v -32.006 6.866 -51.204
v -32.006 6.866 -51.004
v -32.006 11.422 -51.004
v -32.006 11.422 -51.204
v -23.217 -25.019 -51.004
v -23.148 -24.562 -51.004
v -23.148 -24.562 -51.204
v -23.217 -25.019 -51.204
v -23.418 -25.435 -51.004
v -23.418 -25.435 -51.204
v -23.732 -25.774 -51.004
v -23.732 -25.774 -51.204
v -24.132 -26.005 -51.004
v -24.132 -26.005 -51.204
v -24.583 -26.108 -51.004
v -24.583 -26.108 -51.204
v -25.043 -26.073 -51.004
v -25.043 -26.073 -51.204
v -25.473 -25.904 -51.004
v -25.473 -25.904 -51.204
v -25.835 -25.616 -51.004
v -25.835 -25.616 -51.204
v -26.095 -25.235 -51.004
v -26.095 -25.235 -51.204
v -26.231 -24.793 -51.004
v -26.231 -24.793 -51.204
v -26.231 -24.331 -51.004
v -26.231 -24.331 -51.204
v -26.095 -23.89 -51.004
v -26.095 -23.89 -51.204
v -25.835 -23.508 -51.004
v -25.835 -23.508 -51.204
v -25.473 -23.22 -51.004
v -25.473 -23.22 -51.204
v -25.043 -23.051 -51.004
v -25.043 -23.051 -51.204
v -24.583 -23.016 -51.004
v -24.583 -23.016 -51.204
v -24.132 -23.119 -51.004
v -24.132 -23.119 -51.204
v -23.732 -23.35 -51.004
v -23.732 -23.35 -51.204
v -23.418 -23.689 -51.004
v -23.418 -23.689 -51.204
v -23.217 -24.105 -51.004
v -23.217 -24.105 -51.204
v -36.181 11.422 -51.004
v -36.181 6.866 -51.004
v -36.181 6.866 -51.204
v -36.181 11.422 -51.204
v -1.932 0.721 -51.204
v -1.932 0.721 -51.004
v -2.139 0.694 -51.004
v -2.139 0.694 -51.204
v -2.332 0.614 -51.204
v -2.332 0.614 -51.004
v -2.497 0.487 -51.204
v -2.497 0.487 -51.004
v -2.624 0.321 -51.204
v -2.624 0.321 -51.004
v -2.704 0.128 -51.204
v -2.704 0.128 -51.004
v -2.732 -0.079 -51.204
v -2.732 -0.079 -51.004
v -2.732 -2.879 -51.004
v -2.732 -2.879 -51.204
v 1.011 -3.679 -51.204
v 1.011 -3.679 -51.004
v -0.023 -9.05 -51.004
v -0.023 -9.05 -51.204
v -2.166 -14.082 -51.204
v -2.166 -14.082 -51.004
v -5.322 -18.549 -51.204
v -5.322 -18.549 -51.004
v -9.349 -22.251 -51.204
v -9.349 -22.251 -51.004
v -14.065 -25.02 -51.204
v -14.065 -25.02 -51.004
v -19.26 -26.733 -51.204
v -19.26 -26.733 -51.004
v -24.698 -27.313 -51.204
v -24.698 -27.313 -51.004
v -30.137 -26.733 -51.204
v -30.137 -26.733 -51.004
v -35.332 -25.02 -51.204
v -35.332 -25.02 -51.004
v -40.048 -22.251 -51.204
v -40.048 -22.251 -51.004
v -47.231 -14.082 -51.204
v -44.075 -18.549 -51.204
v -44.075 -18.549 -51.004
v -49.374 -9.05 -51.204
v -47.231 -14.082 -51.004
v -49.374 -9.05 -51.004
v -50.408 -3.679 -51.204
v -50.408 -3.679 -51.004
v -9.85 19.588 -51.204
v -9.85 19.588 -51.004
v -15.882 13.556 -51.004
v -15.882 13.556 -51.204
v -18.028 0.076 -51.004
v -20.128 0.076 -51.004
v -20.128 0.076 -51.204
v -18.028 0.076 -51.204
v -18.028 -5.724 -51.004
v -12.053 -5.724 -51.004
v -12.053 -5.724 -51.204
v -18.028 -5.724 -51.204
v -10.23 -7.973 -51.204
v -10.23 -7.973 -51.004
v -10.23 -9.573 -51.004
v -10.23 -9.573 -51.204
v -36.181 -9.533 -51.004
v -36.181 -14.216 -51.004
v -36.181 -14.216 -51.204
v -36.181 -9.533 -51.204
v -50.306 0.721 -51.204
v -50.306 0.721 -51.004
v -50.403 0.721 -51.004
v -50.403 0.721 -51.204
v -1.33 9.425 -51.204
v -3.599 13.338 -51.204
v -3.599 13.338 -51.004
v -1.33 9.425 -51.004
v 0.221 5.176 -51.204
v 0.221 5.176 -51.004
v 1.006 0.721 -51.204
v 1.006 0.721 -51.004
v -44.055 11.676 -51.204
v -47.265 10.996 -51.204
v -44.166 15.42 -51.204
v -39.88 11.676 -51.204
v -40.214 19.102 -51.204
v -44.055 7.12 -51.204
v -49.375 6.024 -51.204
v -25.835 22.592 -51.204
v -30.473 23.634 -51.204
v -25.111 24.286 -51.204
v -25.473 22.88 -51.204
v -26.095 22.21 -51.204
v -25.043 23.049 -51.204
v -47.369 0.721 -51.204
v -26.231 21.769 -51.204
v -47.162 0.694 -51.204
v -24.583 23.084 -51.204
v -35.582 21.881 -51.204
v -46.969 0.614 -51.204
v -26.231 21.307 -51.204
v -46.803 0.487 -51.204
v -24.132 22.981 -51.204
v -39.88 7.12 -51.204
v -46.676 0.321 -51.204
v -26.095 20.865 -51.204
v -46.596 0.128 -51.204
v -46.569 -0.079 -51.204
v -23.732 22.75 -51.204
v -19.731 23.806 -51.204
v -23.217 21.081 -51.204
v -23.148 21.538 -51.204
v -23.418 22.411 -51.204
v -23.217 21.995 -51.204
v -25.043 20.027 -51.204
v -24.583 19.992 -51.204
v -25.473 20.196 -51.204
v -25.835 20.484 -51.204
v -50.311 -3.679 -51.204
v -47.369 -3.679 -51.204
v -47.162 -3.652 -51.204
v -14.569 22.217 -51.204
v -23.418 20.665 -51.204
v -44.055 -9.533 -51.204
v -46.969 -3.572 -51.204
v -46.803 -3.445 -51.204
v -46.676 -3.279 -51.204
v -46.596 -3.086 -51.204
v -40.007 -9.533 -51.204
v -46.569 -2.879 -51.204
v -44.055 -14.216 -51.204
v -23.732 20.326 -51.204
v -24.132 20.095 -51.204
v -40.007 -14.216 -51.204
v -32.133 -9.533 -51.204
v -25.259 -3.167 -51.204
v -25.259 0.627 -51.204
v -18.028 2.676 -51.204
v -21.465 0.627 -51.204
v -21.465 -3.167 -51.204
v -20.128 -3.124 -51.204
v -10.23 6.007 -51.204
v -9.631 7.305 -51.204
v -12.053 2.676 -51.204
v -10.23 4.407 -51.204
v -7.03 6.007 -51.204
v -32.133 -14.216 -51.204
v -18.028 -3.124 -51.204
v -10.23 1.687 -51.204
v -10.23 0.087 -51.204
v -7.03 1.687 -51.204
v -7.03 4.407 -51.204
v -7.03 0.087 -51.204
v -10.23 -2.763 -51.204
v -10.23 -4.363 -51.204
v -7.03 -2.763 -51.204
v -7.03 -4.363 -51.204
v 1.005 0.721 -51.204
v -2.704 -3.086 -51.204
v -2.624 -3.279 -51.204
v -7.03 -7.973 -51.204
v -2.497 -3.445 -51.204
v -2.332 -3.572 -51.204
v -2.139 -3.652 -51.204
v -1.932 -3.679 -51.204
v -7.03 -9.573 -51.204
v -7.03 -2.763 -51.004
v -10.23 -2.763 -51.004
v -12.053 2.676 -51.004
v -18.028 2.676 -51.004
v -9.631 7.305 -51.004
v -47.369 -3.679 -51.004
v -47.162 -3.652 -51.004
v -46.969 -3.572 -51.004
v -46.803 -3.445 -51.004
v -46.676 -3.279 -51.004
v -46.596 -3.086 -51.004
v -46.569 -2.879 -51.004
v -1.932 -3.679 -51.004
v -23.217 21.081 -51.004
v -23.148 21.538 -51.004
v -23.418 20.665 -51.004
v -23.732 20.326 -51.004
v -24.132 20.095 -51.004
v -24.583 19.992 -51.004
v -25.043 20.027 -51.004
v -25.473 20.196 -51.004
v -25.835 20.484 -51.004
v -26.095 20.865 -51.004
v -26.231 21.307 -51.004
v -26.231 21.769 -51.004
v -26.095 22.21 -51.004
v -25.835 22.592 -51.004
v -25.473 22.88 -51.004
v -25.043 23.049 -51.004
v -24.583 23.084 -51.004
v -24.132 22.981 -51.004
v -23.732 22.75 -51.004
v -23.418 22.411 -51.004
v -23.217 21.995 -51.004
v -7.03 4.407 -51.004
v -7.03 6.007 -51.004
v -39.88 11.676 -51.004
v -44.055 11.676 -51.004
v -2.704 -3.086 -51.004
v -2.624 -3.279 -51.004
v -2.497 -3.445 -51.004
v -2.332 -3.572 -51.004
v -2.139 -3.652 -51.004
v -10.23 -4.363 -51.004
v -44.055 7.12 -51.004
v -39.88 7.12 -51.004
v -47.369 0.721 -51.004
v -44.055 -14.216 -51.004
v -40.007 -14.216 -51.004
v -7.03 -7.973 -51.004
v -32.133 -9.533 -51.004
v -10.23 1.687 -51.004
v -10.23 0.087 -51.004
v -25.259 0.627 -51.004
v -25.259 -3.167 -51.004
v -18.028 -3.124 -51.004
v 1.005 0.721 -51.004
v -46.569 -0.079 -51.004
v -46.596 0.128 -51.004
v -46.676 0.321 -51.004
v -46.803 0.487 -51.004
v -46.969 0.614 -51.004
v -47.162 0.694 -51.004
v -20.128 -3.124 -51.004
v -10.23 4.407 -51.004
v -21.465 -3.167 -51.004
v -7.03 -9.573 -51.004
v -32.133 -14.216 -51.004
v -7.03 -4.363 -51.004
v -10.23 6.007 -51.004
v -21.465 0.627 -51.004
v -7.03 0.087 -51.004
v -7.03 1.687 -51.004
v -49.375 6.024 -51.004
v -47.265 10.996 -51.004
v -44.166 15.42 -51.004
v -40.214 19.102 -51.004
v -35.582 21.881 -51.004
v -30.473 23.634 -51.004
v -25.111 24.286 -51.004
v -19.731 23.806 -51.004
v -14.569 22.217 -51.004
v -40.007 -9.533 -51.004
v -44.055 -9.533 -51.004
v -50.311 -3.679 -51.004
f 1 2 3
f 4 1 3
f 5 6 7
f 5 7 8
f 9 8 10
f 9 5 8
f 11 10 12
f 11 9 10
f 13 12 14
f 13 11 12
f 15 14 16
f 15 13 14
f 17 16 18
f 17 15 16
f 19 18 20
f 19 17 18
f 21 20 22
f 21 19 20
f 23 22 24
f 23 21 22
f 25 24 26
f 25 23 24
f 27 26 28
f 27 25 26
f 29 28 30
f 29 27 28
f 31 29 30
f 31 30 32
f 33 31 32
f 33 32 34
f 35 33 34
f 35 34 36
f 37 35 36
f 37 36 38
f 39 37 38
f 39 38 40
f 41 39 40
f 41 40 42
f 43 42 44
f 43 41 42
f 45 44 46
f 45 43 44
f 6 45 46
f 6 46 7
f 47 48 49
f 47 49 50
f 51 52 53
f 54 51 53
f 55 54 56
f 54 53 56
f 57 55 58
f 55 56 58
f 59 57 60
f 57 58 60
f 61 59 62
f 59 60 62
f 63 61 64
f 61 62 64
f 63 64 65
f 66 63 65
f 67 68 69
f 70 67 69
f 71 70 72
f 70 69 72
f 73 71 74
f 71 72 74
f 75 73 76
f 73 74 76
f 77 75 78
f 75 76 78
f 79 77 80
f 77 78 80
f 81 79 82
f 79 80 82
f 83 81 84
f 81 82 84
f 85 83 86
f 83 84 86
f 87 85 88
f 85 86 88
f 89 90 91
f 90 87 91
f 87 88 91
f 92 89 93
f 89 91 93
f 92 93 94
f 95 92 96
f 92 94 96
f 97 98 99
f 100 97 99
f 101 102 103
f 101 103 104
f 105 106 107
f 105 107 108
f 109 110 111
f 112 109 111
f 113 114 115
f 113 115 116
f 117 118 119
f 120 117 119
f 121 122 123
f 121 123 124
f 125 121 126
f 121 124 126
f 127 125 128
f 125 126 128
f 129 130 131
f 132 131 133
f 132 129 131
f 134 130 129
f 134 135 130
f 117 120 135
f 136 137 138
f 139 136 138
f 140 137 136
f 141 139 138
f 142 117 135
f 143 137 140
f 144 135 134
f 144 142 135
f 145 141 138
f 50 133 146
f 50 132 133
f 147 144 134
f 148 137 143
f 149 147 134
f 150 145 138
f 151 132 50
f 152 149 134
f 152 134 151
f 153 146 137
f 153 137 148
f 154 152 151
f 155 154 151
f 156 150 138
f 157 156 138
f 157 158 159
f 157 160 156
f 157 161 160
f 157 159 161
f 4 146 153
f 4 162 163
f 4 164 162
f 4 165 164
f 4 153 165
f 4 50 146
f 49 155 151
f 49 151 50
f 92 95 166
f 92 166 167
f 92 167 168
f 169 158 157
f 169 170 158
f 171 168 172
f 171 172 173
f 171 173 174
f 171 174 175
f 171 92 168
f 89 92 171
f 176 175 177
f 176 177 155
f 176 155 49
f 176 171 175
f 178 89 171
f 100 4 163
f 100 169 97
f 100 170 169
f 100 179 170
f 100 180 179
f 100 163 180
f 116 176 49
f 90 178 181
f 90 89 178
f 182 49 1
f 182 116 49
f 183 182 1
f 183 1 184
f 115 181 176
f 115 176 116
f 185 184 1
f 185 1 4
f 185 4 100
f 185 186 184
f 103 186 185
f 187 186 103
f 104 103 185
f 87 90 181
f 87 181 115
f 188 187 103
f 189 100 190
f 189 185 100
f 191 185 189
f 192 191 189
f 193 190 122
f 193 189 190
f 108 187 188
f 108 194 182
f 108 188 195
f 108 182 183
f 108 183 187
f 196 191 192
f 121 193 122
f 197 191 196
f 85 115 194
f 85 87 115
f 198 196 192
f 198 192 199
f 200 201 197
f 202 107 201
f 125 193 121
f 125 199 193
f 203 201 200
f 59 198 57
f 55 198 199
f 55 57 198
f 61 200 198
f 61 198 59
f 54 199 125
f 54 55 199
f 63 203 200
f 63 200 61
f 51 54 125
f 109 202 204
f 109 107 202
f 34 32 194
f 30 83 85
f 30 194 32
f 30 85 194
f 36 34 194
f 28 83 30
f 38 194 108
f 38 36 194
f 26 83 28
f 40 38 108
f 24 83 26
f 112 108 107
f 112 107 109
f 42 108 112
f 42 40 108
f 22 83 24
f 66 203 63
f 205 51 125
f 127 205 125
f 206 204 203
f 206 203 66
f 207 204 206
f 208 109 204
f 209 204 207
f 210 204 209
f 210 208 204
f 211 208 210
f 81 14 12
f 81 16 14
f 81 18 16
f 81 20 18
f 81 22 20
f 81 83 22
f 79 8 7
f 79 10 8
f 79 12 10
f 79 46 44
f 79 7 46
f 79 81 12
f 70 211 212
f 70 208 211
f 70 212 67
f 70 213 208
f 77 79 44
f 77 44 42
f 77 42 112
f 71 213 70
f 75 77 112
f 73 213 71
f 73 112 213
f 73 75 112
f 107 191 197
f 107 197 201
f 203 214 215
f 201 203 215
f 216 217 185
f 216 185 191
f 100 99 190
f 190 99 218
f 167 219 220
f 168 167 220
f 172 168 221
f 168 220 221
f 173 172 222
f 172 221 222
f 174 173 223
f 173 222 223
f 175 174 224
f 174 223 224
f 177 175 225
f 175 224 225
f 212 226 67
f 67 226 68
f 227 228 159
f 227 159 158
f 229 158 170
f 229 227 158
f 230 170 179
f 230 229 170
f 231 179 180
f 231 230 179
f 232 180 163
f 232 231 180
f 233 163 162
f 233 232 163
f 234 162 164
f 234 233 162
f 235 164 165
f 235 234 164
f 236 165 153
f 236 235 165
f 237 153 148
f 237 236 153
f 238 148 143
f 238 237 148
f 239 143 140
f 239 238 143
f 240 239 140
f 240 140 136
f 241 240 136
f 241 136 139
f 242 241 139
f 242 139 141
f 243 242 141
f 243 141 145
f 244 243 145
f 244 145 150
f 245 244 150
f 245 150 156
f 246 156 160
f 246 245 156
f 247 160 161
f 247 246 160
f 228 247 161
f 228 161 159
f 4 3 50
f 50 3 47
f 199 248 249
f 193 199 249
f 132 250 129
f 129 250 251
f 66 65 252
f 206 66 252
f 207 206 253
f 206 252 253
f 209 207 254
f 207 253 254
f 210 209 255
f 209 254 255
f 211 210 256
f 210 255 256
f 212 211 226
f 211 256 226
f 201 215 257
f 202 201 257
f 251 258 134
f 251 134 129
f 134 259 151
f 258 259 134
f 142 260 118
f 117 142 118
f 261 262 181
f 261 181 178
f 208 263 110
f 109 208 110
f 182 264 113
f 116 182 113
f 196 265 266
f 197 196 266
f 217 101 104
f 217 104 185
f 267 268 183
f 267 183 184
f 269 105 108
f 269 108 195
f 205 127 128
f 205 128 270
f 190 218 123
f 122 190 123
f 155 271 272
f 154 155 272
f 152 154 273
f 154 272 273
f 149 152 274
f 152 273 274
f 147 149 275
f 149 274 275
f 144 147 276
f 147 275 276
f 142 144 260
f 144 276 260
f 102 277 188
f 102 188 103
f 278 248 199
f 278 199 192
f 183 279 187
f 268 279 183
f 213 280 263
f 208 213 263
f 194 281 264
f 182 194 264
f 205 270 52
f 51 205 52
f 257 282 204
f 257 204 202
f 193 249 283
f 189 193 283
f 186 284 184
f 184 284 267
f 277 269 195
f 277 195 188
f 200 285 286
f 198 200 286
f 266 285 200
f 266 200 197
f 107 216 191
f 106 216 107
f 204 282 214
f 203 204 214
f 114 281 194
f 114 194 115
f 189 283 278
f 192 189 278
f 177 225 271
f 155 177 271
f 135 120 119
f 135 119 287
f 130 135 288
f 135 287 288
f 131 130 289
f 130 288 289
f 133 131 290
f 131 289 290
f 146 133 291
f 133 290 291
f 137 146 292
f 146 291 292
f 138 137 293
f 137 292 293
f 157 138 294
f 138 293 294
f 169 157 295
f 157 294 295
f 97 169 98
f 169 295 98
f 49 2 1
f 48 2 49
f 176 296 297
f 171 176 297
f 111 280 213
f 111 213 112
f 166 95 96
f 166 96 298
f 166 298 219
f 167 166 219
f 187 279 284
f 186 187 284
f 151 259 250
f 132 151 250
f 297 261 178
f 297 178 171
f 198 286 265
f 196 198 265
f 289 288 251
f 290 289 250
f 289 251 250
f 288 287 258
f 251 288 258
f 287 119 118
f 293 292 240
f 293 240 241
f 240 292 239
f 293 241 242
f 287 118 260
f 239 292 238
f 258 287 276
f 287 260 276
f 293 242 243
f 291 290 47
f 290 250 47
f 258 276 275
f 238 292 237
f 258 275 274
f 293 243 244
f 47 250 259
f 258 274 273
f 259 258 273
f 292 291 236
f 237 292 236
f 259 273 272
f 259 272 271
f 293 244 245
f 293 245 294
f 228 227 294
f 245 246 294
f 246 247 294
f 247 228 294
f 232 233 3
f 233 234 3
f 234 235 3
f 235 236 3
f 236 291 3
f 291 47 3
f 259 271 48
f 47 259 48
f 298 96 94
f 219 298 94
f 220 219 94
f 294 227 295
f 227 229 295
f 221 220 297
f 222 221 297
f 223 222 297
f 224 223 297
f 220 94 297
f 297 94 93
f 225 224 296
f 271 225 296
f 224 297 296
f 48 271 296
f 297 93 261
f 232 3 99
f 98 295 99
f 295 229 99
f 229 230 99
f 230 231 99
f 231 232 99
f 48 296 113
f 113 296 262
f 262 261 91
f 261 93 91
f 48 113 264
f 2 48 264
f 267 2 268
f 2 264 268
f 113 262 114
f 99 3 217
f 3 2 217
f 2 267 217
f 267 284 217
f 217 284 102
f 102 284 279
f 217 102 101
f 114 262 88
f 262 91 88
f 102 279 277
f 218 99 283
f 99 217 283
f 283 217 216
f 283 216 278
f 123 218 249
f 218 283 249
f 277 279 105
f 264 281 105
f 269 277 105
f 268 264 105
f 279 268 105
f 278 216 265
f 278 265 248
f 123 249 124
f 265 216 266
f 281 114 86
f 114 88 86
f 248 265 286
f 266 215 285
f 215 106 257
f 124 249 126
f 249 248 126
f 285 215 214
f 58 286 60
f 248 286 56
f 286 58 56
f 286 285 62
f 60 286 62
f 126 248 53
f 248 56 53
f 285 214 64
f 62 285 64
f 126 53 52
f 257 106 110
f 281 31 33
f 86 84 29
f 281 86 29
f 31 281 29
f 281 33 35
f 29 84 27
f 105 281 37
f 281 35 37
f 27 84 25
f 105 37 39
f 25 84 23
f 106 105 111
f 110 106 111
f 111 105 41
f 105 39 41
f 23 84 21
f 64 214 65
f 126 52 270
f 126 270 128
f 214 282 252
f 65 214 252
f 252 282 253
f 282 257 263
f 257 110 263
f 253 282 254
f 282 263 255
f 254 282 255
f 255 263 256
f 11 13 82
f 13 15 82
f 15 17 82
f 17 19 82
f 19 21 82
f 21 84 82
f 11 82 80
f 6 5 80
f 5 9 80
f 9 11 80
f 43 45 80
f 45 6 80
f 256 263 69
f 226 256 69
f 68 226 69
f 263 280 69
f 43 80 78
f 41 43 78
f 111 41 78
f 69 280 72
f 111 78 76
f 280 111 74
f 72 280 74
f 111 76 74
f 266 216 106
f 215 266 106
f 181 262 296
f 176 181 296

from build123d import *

# Parameters (mm, degrees)
EXTRUDE_START       = -3.8
SKETCH_1_R          = 25.801076528
SKETCH_1_R_2        = 1.549997321
SKETCH_1_R_3        = 1.54999944
EXTRUDE_1_DEPTH     = 0.2
CUT_EXTRUDE_START   = -3.8
SKETCH_2_W          = 3.794
SKETCH_2_H          = 3.794
SKETCH_2_W_2        = 4.175
SKETCH_2_H_2        = 4.556
SKETCH_2_W_3        = 4.048
SKETCH_2_H_3        = 4.683
CUT_EXTRUDE_1_DEPTH = 0.2
CUT_EXTRUDE_2_DEPTH = 0.2
CUT_EXTRUDE_3_DEPTH = 0.2
CUT_EXTRUDE_4_DEPTH = 0.2
CUT_EXTRUDE_5_DEPTH = 0.2


with BuildPart() as part:
    # 草图1 → 凸台-拉伸1 (new body)
    with BuildSketch(Plane(origin=(0, 0, -54.8040151), x_dir=(-1, 0, 0), z_dir=(0, 0, -1)).offset(EXTRUDE_START)):
        with Locations(Location((24.698490112, -1.512152456, 0), (0, 0, 180))):
            Circle(SKETCH_1_R)
        with Locations(Location((24.698490112, 21.537847164, 0), (0, 0, 180))):
            Circle(SKETCH_1_R_2, mode=Mode.SUBTRACT)
        with Locations(Location((24.698490112, -24.562152076, 0), (0, 0, 180))):
            Circle(SKETCH_1_R_3, mode=Mode.SUBTRACT)
    extrude(amount=EXTRUDE_1_DEPTH)

    # 草图2 → 切除-拉伸1 (cut)
    with BuildSketch(Plane(origin=(0, 0, -54.8040151), x_dir=(-1, 0, 0), z_dir=(0, 0, -1)).offset(CUT_EXTRUDE_START)):
        with Locations((23.362494109, -1.270150744)):
            Rectangle(SKETCH_2_W, SKETCH_2_H)
        with Locations((34.093992827, 9.14385072)):
            Rectangle(SKETCH_2_W_2, SKETCH_2_H_2)
        with Locations((41.967993376, 9.397848523)):
            Rectangle(SKETCH_2_W_2, SKETCH_2_H_2)
        with Locations((34.157492278, -11.874650561)):
            Rectangle(SKETCH_2_W_3, SKETCH_2_H_3)
        with Locations((42.031492827, -11.874650561)):
            Rectangle(SKETCH_2_W_3, SKETCH_2_H_3)
    extrude(amount=CUT_EXTRUDE_1_DEPTH, mode=Mode.SUBTRACT)

    # 草图3 → 切除-拉伸2 (cut)
    with BuildSketch(Plane(origin=(0, 0, -54.8040151), x_dir=(-1, 0, 0), z_dir=(0, 0, -1)).offset(CUT_EXTRUDE_START)):
        Polygon((15.882224059, 13.556279819), (9.63139829, 7.305454051), (2.996403479, 13.940448863), (9.247230868, 20.191276253), align=None)
    extrude(amount=CUT_EXTRUDE_2_DEPTH, mode=Mode.SUBTRACT)

    # 草图4 → 切除-拉伸3 (cut)
    with BuildSketch(Plane(origin=(0, 0, -54.8040151), x_dir=(-1, 0, 0), z_dir=(0, 0, -1)).offset(CUT_EXTRUDE_START)):
        Polygon((7.030438471, 4.406785556), (7.030438471, 6.006785556), (10.230438471, 6.006785556), (10.230438471, 4.406785556), (8.630438471, 4.406785556), align=None)
        Polygon((7.030438471, 0.086785556), (7.030438471, 1.686785556), (10.230438471, 1.686785556), (10.230438471, 0.086785556), (8.630438471, 0.086785556), align=None)
        Polygon((7.030438471, -4.363214444), (7.030438471, -2.763214444), (10.230438471, -2.763214444), (10.230438471, -4.363214444), (8.630438471, -4.363214444), align=None)
        Polygon((7.030438471, -9.573214444), (7.030438471, -7.973214444), (10.230438471, -7.973214444), (10.230438471, -9.573214444), (8.630438471, -9.573214444), align=None)
    extrude(amount=CUT_EXTRUDE_3_DEPTH, mode=Mode.SUBTRACT)

    # 草图5 → 切除-拉伸4 (cut)
    with BuildSketch(Plane(origin=(0, 0, -54.8040151), x_dir=(-1, 0, 0), z_dir=(0, 0, -1)).offset(CUT_EXTRUDE_START)):
        Polygon((14.853491423, 2.675851453), (12.053491423, 2.675851453), (12.053491423, -5.724148547), (14.853491423, -5.724148547), (18.028494414, -5.724148547), (18.028494414, -3.124148547), (20.128494414, -3.124148547), (20.128494414, 0.075851453), (18.028494414, 0.075851453), (18.028494414, 2.675851453), (17.653491423, 2.675851453), align=None)
    extrude(amount=CUT_EXTRUDE_4_DEPTH, mode=Mode.SUBTRACT)

    # 草图7 → 切除-拉伸5 (cut)
    with BuildSketch(Plane(origin=(0, 0, -54.8040151), x_dir=(-1, 0, 0), z_dir=(0, 0, -1)).offset(CUT_EXTRUDE_START)):
        with BuildLine():
            Line((50.959593828, -3.679110402), (50.311348997, -3.679110402))
            Line((50.311348997, -3.679110402), (47.368920104, -3.679058566))
            ThreePointArc((47.368920104, -3.679058566), (46.803238807, -3.444734025), (46.568934198, -2.879044472))
            Line((46.568934198, -2.879044472), (46.568983525, -0.079044473))
            ThreePointArc((46.568983525, -0.079044473), (46.803308066, 0.486636824), (47.368997619, 0.720941434))
            Line((47.368997619, 0.720941434), (50.305693305, 0.720889698))
            Line((50.305693305, 0.720889698), (50.959593828, 0.720889698))
            Line((50.959593828, 0.720889698), (50.959593828, -3.679110402))
        make_face()
        with BuildLine():
            Line((-1.005097138, 0.720889698), (1.931598548, 0.720941434))
            ThreePointArc((1.931598548, 0.720941434), (2.497288101, 0.486636824), (2.731612641, -0.079044473))
            Line((2.731612641, -0.079044473), (2.731661969, -2.879044472))
            ThreePointArc((2.731661969, -2.879044472), (2.49735736, -3.444734025), (1.931676063, -3.679058566))
            Line((1.931676063, -3.679058566), (-1.01075283, -3.679110402))
            Line((-1.01075283, -3.679110402), (-1.658997661, -3.679110402))
            Line((-1.658997661, -3.679110402), (-1.658997661, 0.720889698))
            Line((-1.658997661, 0.720889698), (-1.005097138, 0.720889698))
        make_face()
    extrude(amount=CUT_EXTRUDE_5_DEPTH, mode=Mode.SUBTRACT)


solid = part.part
